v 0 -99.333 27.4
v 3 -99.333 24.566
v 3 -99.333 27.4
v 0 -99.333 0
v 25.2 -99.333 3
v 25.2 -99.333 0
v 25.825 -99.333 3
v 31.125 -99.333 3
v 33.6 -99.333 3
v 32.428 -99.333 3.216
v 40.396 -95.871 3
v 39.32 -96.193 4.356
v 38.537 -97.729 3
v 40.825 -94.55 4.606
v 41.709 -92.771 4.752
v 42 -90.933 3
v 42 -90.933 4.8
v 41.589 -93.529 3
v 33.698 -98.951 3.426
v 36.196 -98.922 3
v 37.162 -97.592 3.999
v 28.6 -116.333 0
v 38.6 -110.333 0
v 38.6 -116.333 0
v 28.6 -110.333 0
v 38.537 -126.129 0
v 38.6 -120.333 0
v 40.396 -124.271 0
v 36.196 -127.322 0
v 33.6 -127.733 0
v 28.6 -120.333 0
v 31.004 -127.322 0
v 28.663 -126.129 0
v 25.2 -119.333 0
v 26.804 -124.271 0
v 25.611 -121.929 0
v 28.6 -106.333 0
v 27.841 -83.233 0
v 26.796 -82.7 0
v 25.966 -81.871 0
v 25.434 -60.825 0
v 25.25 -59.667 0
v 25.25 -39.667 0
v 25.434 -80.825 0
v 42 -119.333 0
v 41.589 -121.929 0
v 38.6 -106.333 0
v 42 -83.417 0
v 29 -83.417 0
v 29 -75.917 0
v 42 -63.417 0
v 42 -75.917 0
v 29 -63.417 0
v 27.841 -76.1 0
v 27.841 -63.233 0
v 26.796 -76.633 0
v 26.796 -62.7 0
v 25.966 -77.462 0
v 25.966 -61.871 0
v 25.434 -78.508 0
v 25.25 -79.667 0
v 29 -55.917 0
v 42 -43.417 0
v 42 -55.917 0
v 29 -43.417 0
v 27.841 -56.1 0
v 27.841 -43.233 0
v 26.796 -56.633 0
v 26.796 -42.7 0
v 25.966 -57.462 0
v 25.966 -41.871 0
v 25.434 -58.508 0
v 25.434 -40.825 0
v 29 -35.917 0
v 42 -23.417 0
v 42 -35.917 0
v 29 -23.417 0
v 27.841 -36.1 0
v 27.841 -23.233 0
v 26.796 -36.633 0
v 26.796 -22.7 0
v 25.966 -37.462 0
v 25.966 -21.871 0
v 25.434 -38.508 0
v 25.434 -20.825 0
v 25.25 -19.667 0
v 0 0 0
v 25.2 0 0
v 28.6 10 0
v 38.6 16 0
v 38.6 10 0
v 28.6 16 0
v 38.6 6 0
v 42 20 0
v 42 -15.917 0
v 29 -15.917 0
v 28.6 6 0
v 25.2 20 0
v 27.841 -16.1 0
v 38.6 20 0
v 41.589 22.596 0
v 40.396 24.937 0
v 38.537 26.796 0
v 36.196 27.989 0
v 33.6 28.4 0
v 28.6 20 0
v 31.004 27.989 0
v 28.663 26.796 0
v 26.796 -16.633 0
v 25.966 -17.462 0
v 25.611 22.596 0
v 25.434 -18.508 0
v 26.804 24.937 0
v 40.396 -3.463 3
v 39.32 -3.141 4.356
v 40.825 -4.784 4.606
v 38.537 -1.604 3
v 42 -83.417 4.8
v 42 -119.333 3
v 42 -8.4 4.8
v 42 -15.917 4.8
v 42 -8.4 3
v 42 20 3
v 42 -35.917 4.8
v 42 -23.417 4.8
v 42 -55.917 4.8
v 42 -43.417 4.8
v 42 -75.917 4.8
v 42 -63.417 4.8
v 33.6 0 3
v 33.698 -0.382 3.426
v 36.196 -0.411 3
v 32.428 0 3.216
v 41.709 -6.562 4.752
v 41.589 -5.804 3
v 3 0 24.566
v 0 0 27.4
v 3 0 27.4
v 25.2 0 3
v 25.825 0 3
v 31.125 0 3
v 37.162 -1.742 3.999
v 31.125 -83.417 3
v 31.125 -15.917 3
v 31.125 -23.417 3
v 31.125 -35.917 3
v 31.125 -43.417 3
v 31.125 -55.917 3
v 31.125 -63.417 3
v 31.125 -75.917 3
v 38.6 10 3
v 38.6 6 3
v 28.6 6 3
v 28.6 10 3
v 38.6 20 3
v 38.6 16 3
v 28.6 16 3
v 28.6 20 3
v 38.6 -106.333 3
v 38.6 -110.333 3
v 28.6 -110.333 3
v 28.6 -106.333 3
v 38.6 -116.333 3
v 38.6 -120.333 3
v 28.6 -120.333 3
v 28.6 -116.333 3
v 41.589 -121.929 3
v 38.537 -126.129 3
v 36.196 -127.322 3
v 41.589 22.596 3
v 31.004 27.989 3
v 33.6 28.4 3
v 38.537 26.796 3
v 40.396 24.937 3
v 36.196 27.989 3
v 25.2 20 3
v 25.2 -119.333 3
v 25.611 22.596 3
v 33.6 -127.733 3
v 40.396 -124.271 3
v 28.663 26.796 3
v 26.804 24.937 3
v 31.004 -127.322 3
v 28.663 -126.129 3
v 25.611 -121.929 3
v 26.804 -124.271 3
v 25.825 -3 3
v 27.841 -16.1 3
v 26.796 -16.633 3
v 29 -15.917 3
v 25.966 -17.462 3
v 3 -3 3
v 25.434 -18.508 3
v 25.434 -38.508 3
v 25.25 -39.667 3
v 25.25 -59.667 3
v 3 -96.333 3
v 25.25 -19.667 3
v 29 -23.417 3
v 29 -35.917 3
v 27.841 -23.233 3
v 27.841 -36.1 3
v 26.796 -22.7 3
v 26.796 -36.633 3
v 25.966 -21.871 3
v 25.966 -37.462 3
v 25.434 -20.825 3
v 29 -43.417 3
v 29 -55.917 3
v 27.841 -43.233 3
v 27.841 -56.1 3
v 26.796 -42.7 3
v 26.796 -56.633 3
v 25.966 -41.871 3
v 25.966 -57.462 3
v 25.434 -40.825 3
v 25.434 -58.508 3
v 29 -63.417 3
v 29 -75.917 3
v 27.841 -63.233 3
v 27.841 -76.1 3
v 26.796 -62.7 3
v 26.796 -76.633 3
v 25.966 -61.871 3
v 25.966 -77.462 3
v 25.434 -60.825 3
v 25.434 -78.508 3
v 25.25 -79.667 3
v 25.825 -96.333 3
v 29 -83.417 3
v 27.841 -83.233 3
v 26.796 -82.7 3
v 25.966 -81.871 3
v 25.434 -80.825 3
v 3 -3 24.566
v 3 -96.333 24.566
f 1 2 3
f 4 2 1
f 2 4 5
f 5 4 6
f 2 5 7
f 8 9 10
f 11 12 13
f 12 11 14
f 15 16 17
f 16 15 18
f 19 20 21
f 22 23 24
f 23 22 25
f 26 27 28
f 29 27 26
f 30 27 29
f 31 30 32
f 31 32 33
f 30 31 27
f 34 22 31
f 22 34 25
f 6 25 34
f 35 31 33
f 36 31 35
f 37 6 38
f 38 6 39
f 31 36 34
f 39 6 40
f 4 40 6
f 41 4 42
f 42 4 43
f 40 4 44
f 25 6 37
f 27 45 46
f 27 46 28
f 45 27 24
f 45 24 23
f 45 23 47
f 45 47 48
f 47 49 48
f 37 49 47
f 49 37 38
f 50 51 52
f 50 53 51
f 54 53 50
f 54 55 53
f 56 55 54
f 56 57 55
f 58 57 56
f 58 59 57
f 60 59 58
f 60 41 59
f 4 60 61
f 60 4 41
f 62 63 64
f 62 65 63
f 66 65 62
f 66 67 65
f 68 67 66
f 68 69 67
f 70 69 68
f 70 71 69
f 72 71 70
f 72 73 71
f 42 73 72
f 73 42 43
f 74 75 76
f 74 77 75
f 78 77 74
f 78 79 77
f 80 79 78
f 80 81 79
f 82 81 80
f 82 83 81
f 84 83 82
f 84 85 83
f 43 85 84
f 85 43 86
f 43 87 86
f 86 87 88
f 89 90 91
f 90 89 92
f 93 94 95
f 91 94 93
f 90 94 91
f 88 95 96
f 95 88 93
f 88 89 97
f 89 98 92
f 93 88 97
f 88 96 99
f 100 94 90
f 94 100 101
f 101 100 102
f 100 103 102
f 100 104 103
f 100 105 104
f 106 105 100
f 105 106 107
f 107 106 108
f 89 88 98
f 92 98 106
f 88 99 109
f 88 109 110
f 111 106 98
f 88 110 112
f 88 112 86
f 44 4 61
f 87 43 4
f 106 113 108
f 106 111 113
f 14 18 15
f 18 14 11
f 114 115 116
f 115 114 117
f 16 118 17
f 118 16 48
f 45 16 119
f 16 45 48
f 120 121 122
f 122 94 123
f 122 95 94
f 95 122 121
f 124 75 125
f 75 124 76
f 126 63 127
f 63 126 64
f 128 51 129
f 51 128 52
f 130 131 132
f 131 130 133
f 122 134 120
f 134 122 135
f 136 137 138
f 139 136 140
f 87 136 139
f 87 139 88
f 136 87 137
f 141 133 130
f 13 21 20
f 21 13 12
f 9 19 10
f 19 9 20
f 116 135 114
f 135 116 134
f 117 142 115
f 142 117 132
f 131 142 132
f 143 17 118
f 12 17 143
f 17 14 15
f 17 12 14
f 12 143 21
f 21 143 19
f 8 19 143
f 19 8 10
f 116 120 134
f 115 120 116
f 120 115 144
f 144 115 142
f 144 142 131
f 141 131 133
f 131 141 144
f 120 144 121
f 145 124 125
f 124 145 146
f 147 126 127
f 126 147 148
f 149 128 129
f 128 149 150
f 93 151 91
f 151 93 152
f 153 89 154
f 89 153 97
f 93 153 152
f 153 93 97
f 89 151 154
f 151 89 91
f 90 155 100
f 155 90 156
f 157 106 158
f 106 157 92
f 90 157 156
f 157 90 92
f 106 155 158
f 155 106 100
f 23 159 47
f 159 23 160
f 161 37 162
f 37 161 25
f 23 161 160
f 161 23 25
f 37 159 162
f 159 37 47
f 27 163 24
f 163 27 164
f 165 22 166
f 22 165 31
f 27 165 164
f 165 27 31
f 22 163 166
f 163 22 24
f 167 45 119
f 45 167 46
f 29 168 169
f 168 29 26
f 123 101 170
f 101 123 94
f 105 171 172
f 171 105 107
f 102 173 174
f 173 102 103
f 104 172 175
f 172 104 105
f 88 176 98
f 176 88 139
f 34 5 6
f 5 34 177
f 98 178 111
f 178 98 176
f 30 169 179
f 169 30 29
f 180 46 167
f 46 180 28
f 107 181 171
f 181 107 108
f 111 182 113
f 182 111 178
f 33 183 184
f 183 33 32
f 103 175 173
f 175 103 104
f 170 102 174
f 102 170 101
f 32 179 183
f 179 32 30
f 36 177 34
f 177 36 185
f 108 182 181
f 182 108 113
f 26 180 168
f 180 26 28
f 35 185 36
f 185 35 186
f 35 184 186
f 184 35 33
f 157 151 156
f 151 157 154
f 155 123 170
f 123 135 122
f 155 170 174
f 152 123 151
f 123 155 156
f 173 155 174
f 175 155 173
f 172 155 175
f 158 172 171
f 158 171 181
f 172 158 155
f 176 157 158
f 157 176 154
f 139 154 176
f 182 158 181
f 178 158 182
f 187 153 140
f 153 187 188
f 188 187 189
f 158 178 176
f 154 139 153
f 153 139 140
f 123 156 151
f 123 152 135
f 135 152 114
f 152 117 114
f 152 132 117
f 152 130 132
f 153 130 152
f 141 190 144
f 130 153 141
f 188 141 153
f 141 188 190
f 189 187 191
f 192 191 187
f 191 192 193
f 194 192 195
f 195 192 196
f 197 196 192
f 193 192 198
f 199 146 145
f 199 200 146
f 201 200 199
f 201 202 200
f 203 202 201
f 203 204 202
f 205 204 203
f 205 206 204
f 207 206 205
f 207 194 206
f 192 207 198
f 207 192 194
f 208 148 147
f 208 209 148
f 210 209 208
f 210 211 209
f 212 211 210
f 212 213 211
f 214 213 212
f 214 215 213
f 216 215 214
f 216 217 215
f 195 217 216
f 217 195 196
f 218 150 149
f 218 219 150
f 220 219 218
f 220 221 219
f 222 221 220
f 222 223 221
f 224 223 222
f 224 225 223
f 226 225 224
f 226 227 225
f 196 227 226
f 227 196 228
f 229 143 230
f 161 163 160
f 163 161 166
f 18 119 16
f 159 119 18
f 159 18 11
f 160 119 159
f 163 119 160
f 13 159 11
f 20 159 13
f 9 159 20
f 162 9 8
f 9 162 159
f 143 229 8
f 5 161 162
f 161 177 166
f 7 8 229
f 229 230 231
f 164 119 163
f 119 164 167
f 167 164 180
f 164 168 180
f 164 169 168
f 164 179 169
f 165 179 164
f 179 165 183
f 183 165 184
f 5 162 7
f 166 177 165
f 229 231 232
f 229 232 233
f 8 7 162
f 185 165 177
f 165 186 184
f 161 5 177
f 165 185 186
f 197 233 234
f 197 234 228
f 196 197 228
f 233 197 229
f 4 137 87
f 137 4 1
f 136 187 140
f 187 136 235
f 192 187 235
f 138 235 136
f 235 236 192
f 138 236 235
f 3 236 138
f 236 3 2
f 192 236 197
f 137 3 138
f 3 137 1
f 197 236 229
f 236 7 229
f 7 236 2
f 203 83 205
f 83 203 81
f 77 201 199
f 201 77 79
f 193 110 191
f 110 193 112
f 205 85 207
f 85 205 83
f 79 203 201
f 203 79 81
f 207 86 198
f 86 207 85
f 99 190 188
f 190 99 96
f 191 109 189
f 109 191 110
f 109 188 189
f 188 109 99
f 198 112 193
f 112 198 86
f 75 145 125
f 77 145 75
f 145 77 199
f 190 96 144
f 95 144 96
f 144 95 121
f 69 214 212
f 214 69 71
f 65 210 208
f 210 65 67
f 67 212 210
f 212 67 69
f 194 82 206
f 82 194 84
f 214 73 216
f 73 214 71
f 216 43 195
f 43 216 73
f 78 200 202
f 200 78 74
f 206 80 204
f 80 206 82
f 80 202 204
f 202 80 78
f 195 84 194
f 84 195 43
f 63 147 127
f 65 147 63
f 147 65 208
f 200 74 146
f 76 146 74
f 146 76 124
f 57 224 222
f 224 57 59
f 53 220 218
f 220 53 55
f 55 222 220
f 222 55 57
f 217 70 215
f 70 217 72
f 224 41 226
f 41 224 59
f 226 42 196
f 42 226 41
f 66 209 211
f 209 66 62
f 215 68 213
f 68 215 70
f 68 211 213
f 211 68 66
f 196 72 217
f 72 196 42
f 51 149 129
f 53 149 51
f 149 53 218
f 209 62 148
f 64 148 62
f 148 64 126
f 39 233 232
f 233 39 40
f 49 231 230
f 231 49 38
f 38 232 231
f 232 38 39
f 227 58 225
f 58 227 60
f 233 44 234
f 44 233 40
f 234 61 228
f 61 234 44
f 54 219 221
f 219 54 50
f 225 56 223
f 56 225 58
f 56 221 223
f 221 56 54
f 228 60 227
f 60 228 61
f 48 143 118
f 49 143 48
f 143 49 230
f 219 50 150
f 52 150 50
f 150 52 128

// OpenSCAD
/*
// dgazineu@gmail.com (Douglas Gazineu)
// Rev1: 2016-08-25 :: Initial Release
// Rev2: 2016-11-10 :: Added Floss holders
//
*/

/* [General Options] */
// Number of Toothbrushes
Toothbrush_Number=4; //[1:6]
Toothbrush_Separation=20; //[15:30]
Toothbrush_NeckSize=7.5; //[5,6.5,7,7.5,8,8.5,9,9.5,10]
Distance_FromMirror=29; //[15:45]
Wall_Size = 3; //[2,2.5,3,3.5,4]
Floss = "y"; // [y:Yes, n:No]
Floss_Left = 2; //[0:6]
Floss_Right = 2; //[0:6]
Floss_Width = 4; //[2.5,3,4,5]
Floss_Distance = 6;//[2:8]
Floss_Depth = 10;//[6:12]

module prism(l, w, h) {
       polyhedron(points=[
               [0,0,h],           // 0    front top corner
               [0,0,0],[w,0,0],   // 1, 2 front left & right bottom corners
               [0,l,h],           // 3    back top corner
               [0,l,0],[w,l,0]    // 4, 5 back left & right bottom corners
       ], faces=[ // points for all faces must be ordered clockwise when looking in
               [0,2,1],    // top face
               [3,4,5],    // base face
               [0,1,4,3],  // h face
               [1,2,5,4],  // w face
               [0,3,5,2],  // hypotenuse face
       ]);
}

module holder(){
    $fn= 20;
    Holder_Width = Toothbrush_Separation*(Toothbrush_Number+(2/3))+2*Wall_Size;
    Holder_Depth = Distance_FromMirror + 13;
    Holder_Height = (3*Distance_FromMirror/5) + 10;
    Round_Corners = 2*Holder_Depth/5;

   difference(){
        union(){
            prism(Wall_Size,Distance_FromMirror,Holder_Height);
            hull(){
                translate([0,Round_Corners/2,0]) cube([Holder_Depth,Holder_Width-Round_Corners,Wall_Size]);
                cube([1,Holder_Width,Wall_Size]);
                translate([Holder_Depth-Round_Corners/2,Round_Corners/2,0]) cylinder( h = Wall_Size, r = Round_Corners/2);
                translate([Holder_Depth-Round_Corners/2,Holder_Width-Round_Corners/2,0]) cylinder( h = Wall_Size, r = Round_Corners/2);
            }
            cube([Wall_Size,Holder_Width,Holder_Height]);
            translate ([0,Holder_Width-Wall_Size,0]) prism(Wall_Size,Distance_FromMirror,Holder_Height);
            intersection(){
                hull(){
                    translate([0,Round_Corners/2,0]) cube([Holder_Depth,Holder_Width-Round_Corners,3*Wall_Size]);
                    cube([1,Holder_Width,3*Wall_Size]);
                    translate([Holder_Depth-Round_Corners/2,Round_Corners/2,0]) cylinder( h = Wall_Size, r = Round_Corners/2);
                    translate([Holder_Depth-Round_Corners/2,Holder_Width-Round_Corners/2,0]) cylinder( h = Wall_Size, r = Round_Corners/2);
                }
                rotate([0,0,180]) translate ([-Holder_Depth,0,0]) mirror([0,1,0]) prism(Holder_Width,Distance_FromMirror,1.6*Wall_Size);
            }
        if ( Floss == "y"){
        
            difference(){
            hull(){
              translate([Holder_Depth-Round_Corners/2,0,0])
              if (Floss_Right > 0){
                 translate([0,-(Floss_Width+Floss_Distance)*Floss_Right,0]) cylinder( h = Wall_Size, r = Round_Corners/2);
              }
              else {
                 translate([0,Round_Corners/2,0]) cylinder( h = Wall_Size, r = Round_Corners/2);
              } 

              translate([Holder_Depth-Round_Corners/2,Holder_Width,0])
              if (Floss_Left > 0){
                 translate([0,(Floss_Width+Floss_Distance)*Floss_Left,0]) cylinder( h = Wall_Size, r = Round_Corners/2);
              }
              else {
                 translate([0,-Round_Corners/2,0]) cylinder( h = Wall_Size, r = Round_Corners/2);
              }
             }
            union(){
               if (Floss_Right > 0){ 
                 for (a =[1:Floss_Right]) {
                  translate([Holder_Depth-((Round_Corners/2)+(Floss_Depth/2)), -(Floss_Width+Floss_Distance)*a, -Wall_Size/2]) cube([Floss_Depth,Floss_Width,Wall_Size*2]);
                 } 
               }
                if (Floss_Left > 0){ 
                 for (b =[1:Floss_Left]) {
                  translate([Holder_Depth-((Round_Corners/2)+(Floss_Depth/2)), Holder_Width+(Floss_Width+Floss_Distance)*b-(Floss_Distance/2),-Wall_Size/2])   cube([Floss_Depth,Floss_Width,Wall_Size*2]);
                 } 
               }
             }
           }
          }
        }
        union(){
            for (a = [1:Toothbrush_Number]){
                translate ([Distance_FromMirror,Wall_Size+((a-2/3)*Toothbrush_Separation)+(Toothbrush_Separation/2),-0.1]) cylinder( h = 3*Wall_Size, r = Toothbrush_NeckSize/2);
                translate ([Distance_FromMirror,Wall_Size+((a-2/3)*Toothbrush_Separation)+(Toothbrush_Separation/2)-Toothbrush_NeckSize/2,-0.1]) cube([16,Toothbrush_NeckSize,3*Wall_Size]);
            }
        }
    }
}

module view(){
   mirror([0,1,0]) holder();
}

view();
